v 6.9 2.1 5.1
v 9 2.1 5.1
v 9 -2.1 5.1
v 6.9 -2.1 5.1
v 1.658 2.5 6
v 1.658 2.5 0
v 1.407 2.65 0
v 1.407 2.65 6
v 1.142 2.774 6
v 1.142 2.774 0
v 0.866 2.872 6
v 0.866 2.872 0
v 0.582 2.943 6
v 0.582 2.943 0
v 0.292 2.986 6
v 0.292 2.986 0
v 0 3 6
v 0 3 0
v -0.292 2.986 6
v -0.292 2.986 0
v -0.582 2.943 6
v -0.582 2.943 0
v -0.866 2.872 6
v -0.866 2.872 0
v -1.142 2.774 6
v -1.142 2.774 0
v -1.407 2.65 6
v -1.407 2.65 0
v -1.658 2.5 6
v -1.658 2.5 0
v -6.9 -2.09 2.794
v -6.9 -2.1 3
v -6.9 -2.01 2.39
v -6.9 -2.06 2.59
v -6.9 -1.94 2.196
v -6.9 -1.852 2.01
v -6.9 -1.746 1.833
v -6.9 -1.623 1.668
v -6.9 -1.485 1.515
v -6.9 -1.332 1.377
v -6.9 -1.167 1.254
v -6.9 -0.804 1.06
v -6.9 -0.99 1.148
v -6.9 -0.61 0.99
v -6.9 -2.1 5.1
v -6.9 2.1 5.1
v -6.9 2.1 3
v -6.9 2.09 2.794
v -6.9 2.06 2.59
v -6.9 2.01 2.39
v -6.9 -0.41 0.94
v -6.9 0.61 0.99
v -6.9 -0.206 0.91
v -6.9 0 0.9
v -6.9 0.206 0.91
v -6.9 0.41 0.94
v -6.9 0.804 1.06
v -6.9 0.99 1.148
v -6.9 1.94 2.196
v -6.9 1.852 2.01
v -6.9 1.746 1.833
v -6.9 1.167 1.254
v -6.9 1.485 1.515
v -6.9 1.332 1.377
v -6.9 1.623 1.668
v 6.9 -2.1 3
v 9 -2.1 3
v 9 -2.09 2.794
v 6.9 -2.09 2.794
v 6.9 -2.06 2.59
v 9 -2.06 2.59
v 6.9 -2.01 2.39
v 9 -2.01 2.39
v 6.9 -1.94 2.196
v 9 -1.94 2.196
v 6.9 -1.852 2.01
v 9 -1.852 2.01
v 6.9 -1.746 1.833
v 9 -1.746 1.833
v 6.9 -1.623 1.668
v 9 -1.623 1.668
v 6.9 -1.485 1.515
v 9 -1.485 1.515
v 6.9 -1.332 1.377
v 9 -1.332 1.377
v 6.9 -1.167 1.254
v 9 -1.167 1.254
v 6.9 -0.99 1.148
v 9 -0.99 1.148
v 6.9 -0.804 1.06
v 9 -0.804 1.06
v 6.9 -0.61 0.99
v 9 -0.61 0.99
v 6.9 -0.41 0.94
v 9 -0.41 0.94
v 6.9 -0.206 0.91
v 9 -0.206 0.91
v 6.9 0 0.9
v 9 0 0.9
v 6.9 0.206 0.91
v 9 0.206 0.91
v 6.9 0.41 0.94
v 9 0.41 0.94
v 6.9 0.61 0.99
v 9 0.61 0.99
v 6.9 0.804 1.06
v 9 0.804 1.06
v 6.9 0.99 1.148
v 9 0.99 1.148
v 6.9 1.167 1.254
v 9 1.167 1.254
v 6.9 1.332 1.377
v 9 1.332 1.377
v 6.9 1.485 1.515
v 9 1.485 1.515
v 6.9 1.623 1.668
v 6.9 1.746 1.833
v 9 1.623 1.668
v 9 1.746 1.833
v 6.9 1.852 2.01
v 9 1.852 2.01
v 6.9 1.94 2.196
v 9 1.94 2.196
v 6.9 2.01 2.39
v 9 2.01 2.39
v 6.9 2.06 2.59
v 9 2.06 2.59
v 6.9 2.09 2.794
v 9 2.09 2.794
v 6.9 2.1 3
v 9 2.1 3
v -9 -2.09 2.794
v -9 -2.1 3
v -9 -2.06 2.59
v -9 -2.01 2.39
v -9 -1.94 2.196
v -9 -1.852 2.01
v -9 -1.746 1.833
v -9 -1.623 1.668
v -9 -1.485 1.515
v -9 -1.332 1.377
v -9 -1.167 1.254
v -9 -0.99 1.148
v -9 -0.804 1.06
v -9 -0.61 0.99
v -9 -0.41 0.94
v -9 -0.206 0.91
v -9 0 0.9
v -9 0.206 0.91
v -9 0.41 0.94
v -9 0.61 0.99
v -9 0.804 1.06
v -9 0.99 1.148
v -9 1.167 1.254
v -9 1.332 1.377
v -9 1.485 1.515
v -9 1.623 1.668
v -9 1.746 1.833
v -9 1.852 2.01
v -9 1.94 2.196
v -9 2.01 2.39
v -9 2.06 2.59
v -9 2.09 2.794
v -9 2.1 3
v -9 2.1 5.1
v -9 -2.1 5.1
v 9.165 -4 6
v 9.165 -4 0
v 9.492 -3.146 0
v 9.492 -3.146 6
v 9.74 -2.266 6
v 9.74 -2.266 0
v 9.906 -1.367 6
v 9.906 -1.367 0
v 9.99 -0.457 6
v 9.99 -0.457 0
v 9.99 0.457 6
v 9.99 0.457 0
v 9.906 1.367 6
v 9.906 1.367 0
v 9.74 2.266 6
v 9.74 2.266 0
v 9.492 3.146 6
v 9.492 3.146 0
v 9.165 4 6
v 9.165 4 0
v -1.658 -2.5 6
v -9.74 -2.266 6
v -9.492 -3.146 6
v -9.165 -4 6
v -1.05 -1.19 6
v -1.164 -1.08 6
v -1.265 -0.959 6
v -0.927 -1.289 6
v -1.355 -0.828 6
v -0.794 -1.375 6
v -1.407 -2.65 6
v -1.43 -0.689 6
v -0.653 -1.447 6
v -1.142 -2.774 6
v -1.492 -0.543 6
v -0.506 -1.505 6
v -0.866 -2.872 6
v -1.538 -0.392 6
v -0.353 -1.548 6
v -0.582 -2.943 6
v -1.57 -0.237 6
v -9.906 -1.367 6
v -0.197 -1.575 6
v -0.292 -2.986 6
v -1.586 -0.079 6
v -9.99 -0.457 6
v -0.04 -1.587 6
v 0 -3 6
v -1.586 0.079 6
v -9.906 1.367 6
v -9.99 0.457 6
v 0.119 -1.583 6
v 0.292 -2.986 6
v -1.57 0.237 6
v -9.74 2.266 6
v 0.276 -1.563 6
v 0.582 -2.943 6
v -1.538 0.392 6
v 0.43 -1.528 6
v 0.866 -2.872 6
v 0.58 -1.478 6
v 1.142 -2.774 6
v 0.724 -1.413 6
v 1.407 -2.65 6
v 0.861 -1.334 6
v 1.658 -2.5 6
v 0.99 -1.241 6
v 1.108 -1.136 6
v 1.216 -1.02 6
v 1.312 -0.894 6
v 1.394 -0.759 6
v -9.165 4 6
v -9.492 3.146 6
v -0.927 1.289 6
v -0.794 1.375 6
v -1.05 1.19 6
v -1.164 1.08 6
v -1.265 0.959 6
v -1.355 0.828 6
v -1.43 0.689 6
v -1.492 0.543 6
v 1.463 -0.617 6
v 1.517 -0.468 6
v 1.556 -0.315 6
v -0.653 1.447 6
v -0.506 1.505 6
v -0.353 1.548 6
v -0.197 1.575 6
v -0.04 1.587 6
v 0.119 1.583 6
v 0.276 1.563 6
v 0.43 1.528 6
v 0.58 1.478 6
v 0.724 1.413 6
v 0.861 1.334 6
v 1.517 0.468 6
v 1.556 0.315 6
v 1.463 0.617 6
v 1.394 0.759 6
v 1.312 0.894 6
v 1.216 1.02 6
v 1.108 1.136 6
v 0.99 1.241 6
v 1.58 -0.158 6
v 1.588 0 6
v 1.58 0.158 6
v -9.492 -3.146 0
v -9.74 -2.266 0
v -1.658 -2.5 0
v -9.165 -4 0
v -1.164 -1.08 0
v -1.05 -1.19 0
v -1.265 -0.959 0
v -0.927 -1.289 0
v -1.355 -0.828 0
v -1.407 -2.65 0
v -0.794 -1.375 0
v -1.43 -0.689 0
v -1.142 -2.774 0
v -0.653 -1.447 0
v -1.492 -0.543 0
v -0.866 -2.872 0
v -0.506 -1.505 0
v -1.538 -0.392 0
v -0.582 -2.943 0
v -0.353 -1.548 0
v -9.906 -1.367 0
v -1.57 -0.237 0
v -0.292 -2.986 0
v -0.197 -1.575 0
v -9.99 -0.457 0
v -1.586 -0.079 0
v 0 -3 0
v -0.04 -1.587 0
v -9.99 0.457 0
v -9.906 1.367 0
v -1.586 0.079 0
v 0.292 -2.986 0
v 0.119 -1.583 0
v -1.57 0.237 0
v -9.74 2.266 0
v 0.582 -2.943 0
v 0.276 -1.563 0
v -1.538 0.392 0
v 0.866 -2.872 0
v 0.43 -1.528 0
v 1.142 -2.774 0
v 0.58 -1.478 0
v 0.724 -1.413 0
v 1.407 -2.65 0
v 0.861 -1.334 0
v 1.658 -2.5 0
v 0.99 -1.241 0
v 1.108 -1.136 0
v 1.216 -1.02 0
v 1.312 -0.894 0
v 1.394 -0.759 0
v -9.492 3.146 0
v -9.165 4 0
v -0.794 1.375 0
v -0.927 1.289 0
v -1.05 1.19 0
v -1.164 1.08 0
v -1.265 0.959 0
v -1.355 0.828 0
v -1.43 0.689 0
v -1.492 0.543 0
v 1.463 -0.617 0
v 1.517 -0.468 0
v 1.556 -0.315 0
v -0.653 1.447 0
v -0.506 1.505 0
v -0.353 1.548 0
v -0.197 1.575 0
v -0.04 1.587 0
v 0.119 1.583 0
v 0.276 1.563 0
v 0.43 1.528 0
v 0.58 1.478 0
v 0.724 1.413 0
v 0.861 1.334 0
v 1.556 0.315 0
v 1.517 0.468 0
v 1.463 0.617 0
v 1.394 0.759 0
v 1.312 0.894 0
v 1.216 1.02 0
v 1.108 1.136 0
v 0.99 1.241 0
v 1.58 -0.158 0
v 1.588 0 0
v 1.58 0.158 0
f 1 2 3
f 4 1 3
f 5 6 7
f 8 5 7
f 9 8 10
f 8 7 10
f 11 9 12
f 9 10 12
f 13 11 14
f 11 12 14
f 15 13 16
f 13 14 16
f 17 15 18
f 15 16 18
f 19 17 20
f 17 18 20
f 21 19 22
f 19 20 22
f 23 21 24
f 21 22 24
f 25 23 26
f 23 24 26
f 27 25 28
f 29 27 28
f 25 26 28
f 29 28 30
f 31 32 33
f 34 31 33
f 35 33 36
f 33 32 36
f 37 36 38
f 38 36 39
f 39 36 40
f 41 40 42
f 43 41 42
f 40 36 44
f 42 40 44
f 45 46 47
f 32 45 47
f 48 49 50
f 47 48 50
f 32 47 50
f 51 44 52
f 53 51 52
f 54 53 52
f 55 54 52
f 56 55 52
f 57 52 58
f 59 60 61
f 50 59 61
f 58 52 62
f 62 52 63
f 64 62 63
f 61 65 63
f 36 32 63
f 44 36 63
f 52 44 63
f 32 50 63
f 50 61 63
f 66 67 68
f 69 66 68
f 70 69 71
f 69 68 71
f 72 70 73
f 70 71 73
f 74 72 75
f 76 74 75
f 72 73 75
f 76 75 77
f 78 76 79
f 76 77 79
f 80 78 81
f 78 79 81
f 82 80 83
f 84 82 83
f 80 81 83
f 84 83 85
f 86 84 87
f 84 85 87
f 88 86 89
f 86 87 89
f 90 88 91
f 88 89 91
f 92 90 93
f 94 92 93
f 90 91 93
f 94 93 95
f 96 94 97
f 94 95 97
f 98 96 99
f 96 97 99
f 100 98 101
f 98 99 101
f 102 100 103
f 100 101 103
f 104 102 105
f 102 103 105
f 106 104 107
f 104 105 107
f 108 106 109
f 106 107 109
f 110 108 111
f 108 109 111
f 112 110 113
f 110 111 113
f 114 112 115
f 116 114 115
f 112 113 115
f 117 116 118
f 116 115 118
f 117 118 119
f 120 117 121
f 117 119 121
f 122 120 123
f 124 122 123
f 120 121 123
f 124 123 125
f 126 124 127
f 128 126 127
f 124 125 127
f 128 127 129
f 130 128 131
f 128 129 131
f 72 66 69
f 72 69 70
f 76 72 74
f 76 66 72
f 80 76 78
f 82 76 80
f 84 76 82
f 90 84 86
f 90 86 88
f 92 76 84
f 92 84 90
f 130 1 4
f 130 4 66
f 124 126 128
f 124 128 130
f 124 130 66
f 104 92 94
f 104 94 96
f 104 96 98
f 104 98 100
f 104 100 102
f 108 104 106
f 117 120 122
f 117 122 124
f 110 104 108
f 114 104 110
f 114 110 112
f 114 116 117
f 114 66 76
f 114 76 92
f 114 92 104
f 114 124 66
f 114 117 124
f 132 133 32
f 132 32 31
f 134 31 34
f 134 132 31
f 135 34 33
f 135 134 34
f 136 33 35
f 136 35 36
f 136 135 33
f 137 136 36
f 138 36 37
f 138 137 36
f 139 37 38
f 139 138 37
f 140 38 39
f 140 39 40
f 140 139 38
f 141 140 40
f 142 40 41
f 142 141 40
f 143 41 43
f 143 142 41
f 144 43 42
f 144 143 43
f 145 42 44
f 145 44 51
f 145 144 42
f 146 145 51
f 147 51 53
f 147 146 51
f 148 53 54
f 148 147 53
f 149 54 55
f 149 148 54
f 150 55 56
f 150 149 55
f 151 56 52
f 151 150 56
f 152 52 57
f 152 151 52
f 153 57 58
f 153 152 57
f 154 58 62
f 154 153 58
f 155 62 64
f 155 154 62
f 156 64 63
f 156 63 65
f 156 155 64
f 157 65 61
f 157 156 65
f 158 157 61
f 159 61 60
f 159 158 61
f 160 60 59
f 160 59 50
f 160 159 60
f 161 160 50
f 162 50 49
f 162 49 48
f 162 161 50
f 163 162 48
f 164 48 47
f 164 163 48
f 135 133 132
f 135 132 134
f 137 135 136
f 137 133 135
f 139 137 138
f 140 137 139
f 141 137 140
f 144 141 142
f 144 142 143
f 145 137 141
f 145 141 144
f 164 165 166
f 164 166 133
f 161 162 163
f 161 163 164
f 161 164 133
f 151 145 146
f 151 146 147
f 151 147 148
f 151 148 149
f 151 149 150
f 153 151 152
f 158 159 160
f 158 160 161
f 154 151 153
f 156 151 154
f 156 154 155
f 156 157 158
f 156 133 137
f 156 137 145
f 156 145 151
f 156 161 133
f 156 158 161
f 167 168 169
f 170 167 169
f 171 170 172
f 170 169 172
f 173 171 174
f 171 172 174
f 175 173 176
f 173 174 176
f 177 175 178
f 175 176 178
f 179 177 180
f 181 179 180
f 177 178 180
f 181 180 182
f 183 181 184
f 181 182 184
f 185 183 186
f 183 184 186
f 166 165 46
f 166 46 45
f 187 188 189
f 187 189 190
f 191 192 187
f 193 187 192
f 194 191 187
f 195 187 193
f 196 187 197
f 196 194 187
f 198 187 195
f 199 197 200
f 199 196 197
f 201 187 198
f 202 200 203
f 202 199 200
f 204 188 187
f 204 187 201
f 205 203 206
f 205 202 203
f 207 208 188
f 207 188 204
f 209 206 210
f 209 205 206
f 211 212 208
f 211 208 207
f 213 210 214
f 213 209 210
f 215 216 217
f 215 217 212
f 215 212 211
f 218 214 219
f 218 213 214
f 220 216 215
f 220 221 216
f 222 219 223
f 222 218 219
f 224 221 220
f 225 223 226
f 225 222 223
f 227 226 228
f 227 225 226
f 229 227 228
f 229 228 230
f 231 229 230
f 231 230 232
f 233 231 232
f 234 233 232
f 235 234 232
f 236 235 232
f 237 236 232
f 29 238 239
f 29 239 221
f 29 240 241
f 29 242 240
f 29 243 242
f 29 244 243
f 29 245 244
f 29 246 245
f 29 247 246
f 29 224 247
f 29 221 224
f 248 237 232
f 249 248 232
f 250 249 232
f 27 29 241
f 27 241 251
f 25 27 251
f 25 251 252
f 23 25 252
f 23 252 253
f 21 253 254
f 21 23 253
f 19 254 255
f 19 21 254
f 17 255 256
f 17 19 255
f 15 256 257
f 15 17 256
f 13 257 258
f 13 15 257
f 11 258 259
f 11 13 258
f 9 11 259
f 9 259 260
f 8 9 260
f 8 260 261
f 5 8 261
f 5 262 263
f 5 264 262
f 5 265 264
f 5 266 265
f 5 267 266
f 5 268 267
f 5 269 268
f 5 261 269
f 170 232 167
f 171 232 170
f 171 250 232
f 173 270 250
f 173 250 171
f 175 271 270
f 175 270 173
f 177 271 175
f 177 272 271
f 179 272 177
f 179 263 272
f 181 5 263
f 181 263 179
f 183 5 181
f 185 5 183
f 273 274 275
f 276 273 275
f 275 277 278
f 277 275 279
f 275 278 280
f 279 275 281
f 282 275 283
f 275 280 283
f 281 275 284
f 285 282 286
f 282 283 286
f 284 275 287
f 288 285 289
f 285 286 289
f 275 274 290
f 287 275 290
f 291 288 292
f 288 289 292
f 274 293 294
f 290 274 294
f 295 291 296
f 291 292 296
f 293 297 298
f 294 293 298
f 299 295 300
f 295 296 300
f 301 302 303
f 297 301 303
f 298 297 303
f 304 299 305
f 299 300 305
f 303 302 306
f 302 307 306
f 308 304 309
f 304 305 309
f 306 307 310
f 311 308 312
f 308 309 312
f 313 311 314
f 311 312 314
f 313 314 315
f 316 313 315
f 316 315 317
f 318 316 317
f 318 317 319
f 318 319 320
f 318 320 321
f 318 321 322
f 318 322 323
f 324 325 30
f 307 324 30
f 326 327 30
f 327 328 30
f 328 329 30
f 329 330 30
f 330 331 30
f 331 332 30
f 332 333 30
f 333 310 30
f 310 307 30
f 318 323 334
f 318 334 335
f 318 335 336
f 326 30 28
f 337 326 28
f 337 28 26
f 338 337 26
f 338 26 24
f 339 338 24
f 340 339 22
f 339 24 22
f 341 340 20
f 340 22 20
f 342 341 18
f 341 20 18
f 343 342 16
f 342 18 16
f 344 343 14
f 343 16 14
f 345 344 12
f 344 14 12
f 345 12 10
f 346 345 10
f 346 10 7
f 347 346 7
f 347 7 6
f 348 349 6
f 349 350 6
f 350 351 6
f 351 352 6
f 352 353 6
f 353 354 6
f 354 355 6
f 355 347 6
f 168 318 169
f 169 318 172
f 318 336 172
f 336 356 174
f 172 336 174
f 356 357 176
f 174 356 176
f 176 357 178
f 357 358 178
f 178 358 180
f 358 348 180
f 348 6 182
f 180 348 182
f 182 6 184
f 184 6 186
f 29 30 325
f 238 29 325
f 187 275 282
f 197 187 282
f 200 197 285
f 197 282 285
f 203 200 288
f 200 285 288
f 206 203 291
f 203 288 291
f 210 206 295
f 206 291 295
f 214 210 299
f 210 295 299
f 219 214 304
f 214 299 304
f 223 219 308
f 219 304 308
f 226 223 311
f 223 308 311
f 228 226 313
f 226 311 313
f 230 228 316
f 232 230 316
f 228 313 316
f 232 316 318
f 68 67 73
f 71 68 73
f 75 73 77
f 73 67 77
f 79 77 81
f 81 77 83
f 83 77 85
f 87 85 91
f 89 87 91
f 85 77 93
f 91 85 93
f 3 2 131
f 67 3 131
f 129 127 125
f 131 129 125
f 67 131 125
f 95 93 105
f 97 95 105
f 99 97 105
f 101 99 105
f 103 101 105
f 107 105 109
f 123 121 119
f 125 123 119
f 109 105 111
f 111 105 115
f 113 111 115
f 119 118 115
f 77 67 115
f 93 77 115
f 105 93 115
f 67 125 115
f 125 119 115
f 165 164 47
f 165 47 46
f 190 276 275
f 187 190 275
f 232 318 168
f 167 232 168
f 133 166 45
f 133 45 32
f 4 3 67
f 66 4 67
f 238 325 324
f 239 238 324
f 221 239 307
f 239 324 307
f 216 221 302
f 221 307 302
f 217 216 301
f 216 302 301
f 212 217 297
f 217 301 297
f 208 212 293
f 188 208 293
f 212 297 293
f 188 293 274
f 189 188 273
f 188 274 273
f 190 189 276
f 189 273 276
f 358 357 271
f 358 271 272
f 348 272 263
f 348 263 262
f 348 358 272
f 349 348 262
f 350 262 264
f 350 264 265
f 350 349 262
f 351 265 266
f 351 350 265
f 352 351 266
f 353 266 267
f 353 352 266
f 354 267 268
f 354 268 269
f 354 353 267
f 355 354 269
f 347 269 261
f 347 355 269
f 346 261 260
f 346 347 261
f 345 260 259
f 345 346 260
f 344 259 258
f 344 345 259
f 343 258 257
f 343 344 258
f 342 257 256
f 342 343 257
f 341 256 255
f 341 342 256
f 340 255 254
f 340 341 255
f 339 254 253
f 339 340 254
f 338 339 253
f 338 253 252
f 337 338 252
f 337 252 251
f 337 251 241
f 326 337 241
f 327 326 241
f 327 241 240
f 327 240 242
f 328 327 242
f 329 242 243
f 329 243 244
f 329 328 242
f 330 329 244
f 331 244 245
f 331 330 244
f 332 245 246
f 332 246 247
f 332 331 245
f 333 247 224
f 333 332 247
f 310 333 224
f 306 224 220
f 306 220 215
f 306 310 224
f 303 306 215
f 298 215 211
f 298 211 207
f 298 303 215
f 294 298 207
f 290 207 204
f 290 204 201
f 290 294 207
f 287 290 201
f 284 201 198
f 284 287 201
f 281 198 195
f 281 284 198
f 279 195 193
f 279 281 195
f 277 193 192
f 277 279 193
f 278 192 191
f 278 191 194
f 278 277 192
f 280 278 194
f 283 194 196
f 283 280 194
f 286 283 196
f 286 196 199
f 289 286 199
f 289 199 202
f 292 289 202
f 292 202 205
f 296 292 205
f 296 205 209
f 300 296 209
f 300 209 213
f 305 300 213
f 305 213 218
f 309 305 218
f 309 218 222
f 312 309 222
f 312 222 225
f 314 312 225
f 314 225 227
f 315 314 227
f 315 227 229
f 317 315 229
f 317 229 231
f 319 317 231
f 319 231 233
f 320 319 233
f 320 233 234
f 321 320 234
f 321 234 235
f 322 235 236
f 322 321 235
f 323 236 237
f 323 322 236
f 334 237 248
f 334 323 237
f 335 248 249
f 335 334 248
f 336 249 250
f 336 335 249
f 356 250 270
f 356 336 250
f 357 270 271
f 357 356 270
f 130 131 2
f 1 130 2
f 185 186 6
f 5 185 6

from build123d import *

# Parameters (mm, degrees)
SKETCH1_R           = 1.5875
BOSS_EXTRUDE1_DEPTH = 6
CUT_EXTRUDE1_START  = 9
CUT_EXTRUDE1_DEPTH  = 2.1


with BuildPart() as part:
    # Sketch1 → Boss-Extrude1 (new body)
    with BuildSketch(Plane.XY):
        with BuildLine():
            Line((-9.16515139, -4), (-1.658312395, -2.5))
            ThreePointArc((-1.658312395, -2.5), (0, -3), (1.658312395, -2.5))
            Line((1.658312395, -2.5), (9.16515139, -4))
            ThreePointArc((9.16515139, -4), (10, 0), (9.16515139, 4))
            Line((9.16515139, 4), (1.658312395, 2.5))
            ThreePointArc((1.658312395, 2.5), (0, 3), (-1.658312395, 2.5))
            Line((-1.658312395, 2.5), (-9.16515139, 4))
            ThreePointArc((-9.16515139, 4), (-10, 0), (-9.16515139, -4))
        make_face()
        Circle(SKETCH1_R, mode=Mode.SUBTRACT)
    extrude(amount=BOSS_EXTRUDE1_DEPTH)

    # Sketch2 → Cut-Extrude1 (cut)
    with BuildSketch(Plane(origin=(0, 0, 0), x_dir=(0, 0, -1), z_dir=(1, 0, 0)).offset(CUT_EXTRUDE1_START)):
        with BuildLine():
            Line((-3, 2.1), (-5.1, 2.1))
            Line((-5.1, 2.1), (-5.1, -2.1))
            Line((-5.1, -2.1), (-3, -2.1))
            ThreePointArc((-3, -2.1), (-0.9, 0), (-3, 2.1))
        make_face()
    cut_extrude1 = extrude(amount=-CUT_EXTRUDE1_DEPTH, mode=Mode.SUBTRACT)

    # Mirror1: Cut-Extrude1 across plane
    add(cut_extrude1.mirror(Plane(origin=(0, 0, 0), x_dir=(0, 0, 1), z_dir=(1, 0, 0))), mode=Mode.SUBTRACT)


solid = part.part
